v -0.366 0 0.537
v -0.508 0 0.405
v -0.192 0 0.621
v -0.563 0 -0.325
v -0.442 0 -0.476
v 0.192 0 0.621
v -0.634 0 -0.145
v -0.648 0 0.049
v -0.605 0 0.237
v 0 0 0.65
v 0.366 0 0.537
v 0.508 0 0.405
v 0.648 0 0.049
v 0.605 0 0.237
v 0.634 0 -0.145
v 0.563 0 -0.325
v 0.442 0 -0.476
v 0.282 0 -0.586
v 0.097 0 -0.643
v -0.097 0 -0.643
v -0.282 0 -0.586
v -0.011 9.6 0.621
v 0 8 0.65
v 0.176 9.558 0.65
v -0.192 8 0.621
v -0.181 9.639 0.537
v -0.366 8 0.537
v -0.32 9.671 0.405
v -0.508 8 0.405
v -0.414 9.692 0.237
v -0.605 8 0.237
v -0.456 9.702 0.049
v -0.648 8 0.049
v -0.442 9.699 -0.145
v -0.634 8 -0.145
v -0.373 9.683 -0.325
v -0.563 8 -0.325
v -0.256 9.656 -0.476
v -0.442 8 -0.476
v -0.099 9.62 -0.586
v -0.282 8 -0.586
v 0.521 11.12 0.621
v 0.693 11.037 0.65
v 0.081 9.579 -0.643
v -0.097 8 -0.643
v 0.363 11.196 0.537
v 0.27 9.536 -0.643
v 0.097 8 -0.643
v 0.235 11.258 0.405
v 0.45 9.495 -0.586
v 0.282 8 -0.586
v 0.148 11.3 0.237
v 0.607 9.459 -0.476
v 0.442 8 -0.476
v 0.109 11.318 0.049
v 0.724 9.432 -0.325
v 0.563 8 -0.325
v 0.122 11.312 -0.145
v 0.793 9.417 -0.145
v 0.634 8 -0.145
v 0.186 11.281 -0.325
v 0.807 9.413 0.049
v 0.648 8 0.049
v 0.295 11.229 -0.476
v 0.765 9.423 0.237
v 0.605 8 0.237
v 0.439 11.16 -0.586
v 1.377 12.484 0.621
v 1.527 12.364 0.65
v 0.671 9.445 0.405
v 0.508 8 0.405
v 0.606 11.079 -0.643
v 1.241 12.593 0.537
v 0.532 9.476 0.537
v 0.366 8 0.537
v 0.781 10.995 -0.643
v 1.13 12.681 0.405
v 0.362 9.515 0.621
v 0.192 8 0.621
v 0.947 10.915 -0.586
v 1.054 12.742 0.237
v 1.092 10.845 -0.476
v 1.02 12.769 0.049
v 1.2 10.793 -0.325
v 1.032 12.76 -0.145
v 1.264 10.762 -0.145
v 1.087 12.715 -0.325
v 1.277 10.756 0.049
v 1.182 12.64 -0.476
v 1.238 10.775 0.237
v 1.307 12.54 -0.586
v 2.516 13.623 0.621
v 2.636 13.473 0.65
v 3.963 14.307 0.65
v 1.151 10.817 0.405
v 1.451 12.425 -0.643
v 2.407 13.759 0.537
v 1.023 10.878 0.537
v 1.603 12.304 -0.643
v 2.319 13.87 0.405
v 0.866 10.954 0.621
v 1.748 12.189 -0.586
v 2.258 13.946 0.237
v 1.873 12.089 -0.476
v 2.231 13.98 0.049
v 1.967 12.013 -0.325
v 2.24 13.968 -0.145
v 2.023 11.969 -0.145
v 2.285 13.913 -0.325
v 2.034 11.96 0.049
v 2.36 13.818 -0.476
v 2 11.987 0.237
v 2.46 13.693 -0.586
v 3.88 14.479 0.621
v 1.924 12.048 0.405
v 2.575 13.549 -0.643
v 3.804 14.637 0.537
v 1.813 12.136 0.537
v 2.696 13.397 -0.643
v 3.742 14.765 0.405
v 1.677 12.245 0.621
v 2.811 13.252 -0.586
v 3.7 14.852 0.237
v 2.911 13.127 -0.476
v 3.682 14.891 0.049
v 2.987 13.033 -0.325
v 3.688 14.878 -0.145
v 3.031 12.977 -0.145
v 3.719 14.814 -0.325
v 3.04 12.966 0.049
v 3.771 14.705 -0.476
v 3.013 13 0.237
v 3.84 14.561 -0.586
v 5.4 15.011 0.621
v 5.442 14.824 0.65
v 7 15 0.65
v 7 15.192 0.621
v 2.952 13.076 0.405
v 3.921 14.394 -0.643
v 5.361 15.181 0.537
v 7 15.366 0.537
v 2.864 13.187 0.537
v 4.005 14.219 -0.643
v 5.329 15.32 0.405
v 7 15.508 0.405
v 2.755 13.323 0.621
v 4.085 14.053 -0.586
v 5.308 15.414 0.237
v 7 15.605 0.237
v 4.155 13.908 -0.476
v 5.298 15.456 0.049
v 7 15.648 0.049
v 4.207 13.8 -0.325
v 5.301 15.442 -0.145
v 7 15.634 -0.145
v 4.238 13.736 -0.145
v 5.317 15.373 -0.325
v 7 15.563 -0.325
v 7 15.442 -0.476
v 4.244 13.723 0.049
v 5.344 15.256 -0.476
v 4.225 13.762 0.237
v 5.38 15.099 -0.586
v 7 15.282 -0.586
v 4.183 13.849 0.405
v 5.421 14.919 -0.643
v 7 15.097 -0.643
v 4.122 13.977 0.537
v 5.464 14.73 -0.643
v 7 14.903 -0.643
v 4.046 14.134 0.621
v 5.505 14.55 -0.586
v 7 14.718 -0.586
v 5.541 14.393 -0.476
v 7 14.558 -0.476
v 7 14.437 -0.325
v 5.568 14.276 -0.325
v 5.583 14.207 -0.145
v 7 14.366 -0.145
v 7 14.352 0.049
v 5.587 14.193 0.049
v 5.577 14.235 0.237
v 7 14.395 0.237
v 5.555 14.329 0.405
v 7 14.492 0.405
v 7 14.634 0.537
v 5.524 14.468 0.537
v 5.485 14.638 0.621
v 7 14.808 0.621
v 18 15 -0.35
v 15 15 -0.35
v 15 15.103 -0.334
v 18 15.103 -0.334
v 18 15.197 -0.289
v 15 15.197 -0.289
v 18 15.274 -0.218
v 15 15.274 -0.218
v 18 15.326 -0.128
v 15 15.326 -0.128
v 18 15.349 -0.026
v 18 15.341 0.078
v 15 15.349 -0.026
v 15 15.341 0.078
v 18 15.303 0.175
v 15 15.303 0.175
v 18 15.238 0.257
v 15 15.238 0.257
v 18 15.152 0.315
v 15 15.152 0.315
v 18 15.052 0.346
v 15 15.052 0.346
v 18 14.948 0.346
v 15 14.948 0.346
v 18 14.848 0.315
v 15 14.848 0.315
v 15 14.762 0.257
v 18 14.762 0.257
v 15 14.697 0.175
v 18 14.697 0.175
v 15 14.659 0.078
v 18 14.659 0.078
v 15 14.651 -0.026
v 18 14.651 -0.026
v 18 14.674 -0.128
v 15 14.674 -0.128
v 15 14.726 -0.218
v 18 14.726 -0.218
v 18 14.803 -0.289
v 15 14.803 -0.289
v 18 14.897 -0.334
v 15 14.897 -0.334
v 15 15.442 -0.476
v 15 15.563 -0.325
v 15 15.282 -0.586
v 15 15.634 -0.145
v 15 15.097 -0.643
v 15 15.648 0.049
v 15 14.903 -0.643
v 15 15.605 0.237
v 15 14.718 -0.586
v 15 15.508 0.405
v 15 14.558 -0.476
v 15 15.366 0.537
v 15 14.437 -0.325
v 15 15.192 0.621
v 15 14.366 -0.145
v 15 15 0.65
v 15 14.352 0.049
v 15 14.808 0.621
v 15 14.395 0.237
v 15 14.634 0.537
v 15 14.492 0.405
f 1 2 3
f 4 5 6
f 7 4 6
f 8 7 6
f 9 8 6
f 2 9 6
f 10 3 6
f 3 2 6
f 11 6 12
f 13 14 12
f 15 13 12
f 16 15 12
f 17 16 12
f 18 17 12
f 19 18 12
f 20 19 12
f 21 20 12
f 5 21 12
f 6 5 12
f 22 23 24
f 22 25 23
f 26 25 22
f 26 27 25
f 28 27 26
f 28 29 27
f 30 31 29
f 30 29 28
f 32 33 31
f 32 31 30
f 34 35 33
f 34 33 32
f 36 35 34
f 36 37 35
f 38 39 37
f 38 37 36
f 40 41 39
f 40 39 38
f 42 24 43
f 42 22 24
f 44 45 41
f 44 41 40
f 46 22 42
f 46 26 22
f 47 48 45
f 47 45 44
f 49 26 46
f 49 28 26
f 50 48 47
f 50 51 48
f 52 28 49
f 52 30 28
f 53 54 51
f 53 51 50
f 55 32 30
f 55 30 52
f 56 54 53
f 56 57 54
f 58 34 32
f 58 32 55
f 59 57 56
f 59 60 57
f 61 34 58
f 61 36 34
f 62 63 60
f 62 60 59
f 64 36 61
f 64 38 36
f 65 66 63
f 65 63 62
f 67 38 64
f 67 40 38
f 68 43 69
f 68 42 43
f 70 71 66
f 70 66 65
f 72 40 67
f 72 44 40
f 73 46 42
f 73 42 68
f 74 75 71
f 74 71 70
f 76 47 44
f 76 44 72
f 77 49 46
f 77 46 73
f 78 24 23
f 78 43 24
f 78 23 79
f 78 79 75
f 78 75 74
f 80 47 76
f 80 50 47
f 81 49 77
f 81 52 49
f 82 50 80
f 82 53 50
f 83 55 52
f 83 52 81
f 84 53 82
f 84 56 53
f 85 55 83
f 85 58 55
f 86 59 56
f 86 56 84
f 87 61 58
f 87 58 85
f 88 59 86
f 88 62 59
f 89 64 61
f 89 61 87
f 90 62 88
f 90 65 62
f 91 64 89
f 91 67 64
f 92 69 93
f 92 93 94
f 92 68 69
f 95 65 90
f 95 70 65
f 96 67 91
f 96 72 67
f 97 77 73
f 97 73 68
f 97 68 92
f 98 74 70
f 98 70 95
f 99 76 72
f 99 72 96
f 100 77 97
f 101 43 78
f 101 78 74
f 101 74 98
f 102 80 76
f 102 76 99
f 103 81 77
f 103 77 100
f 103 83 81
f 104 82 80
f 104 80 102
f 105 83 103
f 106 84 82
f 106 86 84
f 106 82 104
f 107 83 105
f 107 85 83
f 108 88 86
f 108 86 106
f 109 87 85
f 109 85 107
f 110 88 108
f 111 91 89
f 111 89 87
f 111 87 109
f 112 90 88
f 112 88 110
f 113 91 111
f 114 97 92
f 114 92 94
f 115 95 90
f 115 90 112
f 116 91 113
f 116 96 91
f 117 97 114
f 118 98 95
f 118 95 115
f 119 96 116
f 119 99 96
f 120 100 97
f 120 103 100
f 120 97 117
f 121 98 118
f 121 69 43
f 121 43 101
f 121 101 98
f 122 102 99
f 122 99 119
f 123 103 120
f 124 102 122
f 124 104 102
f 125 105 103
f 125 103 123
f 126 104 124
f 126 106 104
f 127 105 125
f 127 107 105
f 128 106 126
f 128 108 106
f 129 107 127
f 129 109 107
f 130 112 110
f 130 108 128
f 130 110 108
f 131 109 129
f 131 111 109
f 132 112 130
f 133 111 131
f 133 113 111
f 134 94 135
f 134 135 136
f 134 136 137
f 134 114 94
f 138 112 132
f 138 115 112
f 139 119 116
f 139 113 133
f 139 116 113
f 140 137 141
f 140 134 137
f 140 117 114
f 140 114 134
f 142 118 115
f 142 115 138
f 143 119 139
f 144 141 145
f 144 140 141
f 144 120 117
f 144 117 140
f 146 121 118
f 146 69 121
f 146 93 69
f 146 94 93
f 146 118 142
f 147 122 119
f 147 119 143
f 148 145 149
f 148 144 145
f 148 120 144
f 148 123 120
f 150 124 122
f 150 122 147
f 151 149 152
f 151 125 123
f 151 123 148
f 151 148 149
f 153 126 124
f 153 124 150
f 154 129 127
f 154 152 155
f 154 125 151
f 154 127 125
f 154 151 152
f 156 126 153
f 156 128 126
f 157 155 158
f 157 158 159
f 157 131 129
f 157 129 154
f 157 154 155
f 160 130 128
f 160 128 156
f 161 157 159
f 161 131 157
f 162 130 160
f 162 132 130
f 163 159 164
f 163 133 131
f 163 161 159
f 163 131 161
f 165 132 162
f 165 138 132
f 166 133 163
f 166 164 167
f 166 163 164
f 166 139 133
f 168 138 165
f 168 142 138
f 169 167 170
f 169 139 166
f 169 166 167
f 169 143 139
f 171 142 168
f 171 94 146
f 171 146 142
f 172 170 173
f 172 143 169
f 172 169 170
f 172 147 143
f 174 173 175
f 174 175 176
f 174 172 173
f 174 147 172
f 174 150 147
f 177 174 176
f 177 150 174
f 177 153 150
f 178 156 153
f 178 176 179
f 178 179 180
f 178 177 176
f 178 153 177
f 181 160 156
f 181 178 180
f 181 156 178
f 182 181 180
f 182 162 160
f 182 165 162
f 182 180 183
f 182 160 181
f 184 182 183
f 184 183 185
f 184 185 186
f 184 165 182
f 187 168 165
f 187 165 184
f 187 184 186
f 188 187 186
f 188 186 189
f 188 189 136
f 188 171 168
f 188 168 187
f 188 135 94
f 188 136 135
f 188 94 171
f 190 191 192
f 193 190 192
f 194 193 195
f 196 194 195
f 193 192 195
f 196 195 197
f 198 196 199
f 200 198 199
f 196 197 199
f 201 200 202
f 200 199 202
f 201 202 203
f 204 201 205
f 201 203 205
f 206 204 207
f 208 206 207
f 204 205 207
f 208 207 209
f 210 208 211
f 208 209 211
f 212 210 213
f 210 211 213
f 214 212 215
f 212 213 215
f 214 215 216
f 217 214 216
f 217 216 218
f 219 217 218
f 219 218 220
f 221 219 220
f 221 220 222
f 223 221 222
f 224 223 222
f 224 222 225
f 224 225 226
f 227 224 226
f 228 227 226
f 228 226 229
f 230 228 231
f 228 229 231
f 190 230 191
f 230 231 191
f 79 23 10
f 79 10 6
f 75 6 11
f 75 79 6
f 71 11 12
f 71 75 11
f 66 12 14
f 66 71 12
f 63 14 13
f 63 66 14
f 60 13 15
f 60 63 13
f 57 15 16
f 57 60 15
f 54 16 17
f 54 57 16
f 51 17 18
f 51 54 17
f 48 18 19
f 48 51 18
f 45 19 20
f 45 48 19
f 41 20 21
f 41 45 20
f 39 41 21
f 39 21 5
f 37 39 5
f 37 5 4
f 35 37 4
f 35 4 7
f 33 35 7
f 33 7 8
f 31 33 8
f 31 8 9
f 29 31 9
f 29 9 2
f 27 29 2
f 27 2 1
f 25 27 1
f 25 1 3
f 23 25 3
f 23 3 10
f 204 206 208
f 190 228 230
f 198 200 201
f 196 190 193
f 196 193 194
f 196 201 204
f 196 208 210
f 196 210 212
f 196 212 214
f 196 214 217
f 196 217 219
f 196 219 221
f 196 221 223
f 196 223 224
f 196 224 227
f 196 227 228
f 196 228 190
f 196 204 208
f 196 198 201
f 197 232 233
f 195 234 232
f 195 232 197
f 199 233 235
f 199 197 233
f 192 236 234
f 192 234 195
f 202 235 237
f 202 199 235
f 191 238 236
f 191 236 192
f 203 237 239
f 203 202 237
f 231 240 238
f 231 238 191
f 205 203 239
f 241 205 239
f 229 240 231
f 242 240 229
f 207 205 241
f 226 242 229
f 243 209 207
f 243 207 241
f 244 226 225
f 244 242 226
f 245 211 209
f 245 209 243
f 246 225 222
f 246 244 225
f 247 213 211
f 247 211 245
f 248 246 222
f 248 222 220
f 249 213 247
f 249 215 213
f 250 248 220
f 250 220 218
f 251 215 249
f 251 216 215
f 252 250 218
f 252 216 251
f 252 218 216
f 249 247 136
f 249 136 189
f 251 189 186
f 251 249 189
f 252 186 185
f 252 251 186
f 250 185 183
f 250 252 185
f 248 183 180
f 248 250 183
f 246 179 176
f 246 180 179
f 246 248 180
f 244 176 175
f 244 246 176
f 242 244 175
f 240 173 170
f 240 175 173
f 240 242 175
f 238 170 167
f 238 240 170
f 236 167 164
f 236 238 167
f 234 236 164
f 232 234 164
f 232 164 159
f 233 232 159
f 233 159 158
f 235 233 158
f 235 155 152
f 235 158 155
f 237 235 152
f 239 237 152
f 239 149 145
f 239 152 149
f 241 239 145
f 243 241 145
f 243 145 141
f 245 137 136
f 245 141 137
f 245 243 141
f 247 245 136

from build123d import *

# Parameters (mm, degrees)
SWEEP1_PROFILE_R    = 0.65
SKETCH9_R           = 0.35
BOSS_EXTRUDE1_DEPTH = 3


with BuildPart() as part:
    # Sweep1: sweep along a path in Sketch1
    with BuildLine(Plane.XY) as sweep1_path:
        Line((0, 0), (0, 8))
        ThreePointArc((0, 8), (2.050252532, 12.949747468), (7, 15))
        Line((7, 15), (15, 15))
    # Sweep1 profile (on start of the path) → Sweep1 (sweep)
    with BuildSketch(Plane.ZX):
        Circle(SWEEP1_PROFILE_R)
    sweep(path=sweep1_path.line)

    # Sketch9 → Boss-Extrude1 (add)
    with BuildSketch(Plane(origin=(15, 0, 0), x_dir=(0, 0, -1), z_dir=(1, 0, 0))):
        with Locations((0, 15)):
            Circle(SKETCH9_R)
    extrude(amount=BOSS_EXTRUDE1_DEPTH)


solid = part.part
